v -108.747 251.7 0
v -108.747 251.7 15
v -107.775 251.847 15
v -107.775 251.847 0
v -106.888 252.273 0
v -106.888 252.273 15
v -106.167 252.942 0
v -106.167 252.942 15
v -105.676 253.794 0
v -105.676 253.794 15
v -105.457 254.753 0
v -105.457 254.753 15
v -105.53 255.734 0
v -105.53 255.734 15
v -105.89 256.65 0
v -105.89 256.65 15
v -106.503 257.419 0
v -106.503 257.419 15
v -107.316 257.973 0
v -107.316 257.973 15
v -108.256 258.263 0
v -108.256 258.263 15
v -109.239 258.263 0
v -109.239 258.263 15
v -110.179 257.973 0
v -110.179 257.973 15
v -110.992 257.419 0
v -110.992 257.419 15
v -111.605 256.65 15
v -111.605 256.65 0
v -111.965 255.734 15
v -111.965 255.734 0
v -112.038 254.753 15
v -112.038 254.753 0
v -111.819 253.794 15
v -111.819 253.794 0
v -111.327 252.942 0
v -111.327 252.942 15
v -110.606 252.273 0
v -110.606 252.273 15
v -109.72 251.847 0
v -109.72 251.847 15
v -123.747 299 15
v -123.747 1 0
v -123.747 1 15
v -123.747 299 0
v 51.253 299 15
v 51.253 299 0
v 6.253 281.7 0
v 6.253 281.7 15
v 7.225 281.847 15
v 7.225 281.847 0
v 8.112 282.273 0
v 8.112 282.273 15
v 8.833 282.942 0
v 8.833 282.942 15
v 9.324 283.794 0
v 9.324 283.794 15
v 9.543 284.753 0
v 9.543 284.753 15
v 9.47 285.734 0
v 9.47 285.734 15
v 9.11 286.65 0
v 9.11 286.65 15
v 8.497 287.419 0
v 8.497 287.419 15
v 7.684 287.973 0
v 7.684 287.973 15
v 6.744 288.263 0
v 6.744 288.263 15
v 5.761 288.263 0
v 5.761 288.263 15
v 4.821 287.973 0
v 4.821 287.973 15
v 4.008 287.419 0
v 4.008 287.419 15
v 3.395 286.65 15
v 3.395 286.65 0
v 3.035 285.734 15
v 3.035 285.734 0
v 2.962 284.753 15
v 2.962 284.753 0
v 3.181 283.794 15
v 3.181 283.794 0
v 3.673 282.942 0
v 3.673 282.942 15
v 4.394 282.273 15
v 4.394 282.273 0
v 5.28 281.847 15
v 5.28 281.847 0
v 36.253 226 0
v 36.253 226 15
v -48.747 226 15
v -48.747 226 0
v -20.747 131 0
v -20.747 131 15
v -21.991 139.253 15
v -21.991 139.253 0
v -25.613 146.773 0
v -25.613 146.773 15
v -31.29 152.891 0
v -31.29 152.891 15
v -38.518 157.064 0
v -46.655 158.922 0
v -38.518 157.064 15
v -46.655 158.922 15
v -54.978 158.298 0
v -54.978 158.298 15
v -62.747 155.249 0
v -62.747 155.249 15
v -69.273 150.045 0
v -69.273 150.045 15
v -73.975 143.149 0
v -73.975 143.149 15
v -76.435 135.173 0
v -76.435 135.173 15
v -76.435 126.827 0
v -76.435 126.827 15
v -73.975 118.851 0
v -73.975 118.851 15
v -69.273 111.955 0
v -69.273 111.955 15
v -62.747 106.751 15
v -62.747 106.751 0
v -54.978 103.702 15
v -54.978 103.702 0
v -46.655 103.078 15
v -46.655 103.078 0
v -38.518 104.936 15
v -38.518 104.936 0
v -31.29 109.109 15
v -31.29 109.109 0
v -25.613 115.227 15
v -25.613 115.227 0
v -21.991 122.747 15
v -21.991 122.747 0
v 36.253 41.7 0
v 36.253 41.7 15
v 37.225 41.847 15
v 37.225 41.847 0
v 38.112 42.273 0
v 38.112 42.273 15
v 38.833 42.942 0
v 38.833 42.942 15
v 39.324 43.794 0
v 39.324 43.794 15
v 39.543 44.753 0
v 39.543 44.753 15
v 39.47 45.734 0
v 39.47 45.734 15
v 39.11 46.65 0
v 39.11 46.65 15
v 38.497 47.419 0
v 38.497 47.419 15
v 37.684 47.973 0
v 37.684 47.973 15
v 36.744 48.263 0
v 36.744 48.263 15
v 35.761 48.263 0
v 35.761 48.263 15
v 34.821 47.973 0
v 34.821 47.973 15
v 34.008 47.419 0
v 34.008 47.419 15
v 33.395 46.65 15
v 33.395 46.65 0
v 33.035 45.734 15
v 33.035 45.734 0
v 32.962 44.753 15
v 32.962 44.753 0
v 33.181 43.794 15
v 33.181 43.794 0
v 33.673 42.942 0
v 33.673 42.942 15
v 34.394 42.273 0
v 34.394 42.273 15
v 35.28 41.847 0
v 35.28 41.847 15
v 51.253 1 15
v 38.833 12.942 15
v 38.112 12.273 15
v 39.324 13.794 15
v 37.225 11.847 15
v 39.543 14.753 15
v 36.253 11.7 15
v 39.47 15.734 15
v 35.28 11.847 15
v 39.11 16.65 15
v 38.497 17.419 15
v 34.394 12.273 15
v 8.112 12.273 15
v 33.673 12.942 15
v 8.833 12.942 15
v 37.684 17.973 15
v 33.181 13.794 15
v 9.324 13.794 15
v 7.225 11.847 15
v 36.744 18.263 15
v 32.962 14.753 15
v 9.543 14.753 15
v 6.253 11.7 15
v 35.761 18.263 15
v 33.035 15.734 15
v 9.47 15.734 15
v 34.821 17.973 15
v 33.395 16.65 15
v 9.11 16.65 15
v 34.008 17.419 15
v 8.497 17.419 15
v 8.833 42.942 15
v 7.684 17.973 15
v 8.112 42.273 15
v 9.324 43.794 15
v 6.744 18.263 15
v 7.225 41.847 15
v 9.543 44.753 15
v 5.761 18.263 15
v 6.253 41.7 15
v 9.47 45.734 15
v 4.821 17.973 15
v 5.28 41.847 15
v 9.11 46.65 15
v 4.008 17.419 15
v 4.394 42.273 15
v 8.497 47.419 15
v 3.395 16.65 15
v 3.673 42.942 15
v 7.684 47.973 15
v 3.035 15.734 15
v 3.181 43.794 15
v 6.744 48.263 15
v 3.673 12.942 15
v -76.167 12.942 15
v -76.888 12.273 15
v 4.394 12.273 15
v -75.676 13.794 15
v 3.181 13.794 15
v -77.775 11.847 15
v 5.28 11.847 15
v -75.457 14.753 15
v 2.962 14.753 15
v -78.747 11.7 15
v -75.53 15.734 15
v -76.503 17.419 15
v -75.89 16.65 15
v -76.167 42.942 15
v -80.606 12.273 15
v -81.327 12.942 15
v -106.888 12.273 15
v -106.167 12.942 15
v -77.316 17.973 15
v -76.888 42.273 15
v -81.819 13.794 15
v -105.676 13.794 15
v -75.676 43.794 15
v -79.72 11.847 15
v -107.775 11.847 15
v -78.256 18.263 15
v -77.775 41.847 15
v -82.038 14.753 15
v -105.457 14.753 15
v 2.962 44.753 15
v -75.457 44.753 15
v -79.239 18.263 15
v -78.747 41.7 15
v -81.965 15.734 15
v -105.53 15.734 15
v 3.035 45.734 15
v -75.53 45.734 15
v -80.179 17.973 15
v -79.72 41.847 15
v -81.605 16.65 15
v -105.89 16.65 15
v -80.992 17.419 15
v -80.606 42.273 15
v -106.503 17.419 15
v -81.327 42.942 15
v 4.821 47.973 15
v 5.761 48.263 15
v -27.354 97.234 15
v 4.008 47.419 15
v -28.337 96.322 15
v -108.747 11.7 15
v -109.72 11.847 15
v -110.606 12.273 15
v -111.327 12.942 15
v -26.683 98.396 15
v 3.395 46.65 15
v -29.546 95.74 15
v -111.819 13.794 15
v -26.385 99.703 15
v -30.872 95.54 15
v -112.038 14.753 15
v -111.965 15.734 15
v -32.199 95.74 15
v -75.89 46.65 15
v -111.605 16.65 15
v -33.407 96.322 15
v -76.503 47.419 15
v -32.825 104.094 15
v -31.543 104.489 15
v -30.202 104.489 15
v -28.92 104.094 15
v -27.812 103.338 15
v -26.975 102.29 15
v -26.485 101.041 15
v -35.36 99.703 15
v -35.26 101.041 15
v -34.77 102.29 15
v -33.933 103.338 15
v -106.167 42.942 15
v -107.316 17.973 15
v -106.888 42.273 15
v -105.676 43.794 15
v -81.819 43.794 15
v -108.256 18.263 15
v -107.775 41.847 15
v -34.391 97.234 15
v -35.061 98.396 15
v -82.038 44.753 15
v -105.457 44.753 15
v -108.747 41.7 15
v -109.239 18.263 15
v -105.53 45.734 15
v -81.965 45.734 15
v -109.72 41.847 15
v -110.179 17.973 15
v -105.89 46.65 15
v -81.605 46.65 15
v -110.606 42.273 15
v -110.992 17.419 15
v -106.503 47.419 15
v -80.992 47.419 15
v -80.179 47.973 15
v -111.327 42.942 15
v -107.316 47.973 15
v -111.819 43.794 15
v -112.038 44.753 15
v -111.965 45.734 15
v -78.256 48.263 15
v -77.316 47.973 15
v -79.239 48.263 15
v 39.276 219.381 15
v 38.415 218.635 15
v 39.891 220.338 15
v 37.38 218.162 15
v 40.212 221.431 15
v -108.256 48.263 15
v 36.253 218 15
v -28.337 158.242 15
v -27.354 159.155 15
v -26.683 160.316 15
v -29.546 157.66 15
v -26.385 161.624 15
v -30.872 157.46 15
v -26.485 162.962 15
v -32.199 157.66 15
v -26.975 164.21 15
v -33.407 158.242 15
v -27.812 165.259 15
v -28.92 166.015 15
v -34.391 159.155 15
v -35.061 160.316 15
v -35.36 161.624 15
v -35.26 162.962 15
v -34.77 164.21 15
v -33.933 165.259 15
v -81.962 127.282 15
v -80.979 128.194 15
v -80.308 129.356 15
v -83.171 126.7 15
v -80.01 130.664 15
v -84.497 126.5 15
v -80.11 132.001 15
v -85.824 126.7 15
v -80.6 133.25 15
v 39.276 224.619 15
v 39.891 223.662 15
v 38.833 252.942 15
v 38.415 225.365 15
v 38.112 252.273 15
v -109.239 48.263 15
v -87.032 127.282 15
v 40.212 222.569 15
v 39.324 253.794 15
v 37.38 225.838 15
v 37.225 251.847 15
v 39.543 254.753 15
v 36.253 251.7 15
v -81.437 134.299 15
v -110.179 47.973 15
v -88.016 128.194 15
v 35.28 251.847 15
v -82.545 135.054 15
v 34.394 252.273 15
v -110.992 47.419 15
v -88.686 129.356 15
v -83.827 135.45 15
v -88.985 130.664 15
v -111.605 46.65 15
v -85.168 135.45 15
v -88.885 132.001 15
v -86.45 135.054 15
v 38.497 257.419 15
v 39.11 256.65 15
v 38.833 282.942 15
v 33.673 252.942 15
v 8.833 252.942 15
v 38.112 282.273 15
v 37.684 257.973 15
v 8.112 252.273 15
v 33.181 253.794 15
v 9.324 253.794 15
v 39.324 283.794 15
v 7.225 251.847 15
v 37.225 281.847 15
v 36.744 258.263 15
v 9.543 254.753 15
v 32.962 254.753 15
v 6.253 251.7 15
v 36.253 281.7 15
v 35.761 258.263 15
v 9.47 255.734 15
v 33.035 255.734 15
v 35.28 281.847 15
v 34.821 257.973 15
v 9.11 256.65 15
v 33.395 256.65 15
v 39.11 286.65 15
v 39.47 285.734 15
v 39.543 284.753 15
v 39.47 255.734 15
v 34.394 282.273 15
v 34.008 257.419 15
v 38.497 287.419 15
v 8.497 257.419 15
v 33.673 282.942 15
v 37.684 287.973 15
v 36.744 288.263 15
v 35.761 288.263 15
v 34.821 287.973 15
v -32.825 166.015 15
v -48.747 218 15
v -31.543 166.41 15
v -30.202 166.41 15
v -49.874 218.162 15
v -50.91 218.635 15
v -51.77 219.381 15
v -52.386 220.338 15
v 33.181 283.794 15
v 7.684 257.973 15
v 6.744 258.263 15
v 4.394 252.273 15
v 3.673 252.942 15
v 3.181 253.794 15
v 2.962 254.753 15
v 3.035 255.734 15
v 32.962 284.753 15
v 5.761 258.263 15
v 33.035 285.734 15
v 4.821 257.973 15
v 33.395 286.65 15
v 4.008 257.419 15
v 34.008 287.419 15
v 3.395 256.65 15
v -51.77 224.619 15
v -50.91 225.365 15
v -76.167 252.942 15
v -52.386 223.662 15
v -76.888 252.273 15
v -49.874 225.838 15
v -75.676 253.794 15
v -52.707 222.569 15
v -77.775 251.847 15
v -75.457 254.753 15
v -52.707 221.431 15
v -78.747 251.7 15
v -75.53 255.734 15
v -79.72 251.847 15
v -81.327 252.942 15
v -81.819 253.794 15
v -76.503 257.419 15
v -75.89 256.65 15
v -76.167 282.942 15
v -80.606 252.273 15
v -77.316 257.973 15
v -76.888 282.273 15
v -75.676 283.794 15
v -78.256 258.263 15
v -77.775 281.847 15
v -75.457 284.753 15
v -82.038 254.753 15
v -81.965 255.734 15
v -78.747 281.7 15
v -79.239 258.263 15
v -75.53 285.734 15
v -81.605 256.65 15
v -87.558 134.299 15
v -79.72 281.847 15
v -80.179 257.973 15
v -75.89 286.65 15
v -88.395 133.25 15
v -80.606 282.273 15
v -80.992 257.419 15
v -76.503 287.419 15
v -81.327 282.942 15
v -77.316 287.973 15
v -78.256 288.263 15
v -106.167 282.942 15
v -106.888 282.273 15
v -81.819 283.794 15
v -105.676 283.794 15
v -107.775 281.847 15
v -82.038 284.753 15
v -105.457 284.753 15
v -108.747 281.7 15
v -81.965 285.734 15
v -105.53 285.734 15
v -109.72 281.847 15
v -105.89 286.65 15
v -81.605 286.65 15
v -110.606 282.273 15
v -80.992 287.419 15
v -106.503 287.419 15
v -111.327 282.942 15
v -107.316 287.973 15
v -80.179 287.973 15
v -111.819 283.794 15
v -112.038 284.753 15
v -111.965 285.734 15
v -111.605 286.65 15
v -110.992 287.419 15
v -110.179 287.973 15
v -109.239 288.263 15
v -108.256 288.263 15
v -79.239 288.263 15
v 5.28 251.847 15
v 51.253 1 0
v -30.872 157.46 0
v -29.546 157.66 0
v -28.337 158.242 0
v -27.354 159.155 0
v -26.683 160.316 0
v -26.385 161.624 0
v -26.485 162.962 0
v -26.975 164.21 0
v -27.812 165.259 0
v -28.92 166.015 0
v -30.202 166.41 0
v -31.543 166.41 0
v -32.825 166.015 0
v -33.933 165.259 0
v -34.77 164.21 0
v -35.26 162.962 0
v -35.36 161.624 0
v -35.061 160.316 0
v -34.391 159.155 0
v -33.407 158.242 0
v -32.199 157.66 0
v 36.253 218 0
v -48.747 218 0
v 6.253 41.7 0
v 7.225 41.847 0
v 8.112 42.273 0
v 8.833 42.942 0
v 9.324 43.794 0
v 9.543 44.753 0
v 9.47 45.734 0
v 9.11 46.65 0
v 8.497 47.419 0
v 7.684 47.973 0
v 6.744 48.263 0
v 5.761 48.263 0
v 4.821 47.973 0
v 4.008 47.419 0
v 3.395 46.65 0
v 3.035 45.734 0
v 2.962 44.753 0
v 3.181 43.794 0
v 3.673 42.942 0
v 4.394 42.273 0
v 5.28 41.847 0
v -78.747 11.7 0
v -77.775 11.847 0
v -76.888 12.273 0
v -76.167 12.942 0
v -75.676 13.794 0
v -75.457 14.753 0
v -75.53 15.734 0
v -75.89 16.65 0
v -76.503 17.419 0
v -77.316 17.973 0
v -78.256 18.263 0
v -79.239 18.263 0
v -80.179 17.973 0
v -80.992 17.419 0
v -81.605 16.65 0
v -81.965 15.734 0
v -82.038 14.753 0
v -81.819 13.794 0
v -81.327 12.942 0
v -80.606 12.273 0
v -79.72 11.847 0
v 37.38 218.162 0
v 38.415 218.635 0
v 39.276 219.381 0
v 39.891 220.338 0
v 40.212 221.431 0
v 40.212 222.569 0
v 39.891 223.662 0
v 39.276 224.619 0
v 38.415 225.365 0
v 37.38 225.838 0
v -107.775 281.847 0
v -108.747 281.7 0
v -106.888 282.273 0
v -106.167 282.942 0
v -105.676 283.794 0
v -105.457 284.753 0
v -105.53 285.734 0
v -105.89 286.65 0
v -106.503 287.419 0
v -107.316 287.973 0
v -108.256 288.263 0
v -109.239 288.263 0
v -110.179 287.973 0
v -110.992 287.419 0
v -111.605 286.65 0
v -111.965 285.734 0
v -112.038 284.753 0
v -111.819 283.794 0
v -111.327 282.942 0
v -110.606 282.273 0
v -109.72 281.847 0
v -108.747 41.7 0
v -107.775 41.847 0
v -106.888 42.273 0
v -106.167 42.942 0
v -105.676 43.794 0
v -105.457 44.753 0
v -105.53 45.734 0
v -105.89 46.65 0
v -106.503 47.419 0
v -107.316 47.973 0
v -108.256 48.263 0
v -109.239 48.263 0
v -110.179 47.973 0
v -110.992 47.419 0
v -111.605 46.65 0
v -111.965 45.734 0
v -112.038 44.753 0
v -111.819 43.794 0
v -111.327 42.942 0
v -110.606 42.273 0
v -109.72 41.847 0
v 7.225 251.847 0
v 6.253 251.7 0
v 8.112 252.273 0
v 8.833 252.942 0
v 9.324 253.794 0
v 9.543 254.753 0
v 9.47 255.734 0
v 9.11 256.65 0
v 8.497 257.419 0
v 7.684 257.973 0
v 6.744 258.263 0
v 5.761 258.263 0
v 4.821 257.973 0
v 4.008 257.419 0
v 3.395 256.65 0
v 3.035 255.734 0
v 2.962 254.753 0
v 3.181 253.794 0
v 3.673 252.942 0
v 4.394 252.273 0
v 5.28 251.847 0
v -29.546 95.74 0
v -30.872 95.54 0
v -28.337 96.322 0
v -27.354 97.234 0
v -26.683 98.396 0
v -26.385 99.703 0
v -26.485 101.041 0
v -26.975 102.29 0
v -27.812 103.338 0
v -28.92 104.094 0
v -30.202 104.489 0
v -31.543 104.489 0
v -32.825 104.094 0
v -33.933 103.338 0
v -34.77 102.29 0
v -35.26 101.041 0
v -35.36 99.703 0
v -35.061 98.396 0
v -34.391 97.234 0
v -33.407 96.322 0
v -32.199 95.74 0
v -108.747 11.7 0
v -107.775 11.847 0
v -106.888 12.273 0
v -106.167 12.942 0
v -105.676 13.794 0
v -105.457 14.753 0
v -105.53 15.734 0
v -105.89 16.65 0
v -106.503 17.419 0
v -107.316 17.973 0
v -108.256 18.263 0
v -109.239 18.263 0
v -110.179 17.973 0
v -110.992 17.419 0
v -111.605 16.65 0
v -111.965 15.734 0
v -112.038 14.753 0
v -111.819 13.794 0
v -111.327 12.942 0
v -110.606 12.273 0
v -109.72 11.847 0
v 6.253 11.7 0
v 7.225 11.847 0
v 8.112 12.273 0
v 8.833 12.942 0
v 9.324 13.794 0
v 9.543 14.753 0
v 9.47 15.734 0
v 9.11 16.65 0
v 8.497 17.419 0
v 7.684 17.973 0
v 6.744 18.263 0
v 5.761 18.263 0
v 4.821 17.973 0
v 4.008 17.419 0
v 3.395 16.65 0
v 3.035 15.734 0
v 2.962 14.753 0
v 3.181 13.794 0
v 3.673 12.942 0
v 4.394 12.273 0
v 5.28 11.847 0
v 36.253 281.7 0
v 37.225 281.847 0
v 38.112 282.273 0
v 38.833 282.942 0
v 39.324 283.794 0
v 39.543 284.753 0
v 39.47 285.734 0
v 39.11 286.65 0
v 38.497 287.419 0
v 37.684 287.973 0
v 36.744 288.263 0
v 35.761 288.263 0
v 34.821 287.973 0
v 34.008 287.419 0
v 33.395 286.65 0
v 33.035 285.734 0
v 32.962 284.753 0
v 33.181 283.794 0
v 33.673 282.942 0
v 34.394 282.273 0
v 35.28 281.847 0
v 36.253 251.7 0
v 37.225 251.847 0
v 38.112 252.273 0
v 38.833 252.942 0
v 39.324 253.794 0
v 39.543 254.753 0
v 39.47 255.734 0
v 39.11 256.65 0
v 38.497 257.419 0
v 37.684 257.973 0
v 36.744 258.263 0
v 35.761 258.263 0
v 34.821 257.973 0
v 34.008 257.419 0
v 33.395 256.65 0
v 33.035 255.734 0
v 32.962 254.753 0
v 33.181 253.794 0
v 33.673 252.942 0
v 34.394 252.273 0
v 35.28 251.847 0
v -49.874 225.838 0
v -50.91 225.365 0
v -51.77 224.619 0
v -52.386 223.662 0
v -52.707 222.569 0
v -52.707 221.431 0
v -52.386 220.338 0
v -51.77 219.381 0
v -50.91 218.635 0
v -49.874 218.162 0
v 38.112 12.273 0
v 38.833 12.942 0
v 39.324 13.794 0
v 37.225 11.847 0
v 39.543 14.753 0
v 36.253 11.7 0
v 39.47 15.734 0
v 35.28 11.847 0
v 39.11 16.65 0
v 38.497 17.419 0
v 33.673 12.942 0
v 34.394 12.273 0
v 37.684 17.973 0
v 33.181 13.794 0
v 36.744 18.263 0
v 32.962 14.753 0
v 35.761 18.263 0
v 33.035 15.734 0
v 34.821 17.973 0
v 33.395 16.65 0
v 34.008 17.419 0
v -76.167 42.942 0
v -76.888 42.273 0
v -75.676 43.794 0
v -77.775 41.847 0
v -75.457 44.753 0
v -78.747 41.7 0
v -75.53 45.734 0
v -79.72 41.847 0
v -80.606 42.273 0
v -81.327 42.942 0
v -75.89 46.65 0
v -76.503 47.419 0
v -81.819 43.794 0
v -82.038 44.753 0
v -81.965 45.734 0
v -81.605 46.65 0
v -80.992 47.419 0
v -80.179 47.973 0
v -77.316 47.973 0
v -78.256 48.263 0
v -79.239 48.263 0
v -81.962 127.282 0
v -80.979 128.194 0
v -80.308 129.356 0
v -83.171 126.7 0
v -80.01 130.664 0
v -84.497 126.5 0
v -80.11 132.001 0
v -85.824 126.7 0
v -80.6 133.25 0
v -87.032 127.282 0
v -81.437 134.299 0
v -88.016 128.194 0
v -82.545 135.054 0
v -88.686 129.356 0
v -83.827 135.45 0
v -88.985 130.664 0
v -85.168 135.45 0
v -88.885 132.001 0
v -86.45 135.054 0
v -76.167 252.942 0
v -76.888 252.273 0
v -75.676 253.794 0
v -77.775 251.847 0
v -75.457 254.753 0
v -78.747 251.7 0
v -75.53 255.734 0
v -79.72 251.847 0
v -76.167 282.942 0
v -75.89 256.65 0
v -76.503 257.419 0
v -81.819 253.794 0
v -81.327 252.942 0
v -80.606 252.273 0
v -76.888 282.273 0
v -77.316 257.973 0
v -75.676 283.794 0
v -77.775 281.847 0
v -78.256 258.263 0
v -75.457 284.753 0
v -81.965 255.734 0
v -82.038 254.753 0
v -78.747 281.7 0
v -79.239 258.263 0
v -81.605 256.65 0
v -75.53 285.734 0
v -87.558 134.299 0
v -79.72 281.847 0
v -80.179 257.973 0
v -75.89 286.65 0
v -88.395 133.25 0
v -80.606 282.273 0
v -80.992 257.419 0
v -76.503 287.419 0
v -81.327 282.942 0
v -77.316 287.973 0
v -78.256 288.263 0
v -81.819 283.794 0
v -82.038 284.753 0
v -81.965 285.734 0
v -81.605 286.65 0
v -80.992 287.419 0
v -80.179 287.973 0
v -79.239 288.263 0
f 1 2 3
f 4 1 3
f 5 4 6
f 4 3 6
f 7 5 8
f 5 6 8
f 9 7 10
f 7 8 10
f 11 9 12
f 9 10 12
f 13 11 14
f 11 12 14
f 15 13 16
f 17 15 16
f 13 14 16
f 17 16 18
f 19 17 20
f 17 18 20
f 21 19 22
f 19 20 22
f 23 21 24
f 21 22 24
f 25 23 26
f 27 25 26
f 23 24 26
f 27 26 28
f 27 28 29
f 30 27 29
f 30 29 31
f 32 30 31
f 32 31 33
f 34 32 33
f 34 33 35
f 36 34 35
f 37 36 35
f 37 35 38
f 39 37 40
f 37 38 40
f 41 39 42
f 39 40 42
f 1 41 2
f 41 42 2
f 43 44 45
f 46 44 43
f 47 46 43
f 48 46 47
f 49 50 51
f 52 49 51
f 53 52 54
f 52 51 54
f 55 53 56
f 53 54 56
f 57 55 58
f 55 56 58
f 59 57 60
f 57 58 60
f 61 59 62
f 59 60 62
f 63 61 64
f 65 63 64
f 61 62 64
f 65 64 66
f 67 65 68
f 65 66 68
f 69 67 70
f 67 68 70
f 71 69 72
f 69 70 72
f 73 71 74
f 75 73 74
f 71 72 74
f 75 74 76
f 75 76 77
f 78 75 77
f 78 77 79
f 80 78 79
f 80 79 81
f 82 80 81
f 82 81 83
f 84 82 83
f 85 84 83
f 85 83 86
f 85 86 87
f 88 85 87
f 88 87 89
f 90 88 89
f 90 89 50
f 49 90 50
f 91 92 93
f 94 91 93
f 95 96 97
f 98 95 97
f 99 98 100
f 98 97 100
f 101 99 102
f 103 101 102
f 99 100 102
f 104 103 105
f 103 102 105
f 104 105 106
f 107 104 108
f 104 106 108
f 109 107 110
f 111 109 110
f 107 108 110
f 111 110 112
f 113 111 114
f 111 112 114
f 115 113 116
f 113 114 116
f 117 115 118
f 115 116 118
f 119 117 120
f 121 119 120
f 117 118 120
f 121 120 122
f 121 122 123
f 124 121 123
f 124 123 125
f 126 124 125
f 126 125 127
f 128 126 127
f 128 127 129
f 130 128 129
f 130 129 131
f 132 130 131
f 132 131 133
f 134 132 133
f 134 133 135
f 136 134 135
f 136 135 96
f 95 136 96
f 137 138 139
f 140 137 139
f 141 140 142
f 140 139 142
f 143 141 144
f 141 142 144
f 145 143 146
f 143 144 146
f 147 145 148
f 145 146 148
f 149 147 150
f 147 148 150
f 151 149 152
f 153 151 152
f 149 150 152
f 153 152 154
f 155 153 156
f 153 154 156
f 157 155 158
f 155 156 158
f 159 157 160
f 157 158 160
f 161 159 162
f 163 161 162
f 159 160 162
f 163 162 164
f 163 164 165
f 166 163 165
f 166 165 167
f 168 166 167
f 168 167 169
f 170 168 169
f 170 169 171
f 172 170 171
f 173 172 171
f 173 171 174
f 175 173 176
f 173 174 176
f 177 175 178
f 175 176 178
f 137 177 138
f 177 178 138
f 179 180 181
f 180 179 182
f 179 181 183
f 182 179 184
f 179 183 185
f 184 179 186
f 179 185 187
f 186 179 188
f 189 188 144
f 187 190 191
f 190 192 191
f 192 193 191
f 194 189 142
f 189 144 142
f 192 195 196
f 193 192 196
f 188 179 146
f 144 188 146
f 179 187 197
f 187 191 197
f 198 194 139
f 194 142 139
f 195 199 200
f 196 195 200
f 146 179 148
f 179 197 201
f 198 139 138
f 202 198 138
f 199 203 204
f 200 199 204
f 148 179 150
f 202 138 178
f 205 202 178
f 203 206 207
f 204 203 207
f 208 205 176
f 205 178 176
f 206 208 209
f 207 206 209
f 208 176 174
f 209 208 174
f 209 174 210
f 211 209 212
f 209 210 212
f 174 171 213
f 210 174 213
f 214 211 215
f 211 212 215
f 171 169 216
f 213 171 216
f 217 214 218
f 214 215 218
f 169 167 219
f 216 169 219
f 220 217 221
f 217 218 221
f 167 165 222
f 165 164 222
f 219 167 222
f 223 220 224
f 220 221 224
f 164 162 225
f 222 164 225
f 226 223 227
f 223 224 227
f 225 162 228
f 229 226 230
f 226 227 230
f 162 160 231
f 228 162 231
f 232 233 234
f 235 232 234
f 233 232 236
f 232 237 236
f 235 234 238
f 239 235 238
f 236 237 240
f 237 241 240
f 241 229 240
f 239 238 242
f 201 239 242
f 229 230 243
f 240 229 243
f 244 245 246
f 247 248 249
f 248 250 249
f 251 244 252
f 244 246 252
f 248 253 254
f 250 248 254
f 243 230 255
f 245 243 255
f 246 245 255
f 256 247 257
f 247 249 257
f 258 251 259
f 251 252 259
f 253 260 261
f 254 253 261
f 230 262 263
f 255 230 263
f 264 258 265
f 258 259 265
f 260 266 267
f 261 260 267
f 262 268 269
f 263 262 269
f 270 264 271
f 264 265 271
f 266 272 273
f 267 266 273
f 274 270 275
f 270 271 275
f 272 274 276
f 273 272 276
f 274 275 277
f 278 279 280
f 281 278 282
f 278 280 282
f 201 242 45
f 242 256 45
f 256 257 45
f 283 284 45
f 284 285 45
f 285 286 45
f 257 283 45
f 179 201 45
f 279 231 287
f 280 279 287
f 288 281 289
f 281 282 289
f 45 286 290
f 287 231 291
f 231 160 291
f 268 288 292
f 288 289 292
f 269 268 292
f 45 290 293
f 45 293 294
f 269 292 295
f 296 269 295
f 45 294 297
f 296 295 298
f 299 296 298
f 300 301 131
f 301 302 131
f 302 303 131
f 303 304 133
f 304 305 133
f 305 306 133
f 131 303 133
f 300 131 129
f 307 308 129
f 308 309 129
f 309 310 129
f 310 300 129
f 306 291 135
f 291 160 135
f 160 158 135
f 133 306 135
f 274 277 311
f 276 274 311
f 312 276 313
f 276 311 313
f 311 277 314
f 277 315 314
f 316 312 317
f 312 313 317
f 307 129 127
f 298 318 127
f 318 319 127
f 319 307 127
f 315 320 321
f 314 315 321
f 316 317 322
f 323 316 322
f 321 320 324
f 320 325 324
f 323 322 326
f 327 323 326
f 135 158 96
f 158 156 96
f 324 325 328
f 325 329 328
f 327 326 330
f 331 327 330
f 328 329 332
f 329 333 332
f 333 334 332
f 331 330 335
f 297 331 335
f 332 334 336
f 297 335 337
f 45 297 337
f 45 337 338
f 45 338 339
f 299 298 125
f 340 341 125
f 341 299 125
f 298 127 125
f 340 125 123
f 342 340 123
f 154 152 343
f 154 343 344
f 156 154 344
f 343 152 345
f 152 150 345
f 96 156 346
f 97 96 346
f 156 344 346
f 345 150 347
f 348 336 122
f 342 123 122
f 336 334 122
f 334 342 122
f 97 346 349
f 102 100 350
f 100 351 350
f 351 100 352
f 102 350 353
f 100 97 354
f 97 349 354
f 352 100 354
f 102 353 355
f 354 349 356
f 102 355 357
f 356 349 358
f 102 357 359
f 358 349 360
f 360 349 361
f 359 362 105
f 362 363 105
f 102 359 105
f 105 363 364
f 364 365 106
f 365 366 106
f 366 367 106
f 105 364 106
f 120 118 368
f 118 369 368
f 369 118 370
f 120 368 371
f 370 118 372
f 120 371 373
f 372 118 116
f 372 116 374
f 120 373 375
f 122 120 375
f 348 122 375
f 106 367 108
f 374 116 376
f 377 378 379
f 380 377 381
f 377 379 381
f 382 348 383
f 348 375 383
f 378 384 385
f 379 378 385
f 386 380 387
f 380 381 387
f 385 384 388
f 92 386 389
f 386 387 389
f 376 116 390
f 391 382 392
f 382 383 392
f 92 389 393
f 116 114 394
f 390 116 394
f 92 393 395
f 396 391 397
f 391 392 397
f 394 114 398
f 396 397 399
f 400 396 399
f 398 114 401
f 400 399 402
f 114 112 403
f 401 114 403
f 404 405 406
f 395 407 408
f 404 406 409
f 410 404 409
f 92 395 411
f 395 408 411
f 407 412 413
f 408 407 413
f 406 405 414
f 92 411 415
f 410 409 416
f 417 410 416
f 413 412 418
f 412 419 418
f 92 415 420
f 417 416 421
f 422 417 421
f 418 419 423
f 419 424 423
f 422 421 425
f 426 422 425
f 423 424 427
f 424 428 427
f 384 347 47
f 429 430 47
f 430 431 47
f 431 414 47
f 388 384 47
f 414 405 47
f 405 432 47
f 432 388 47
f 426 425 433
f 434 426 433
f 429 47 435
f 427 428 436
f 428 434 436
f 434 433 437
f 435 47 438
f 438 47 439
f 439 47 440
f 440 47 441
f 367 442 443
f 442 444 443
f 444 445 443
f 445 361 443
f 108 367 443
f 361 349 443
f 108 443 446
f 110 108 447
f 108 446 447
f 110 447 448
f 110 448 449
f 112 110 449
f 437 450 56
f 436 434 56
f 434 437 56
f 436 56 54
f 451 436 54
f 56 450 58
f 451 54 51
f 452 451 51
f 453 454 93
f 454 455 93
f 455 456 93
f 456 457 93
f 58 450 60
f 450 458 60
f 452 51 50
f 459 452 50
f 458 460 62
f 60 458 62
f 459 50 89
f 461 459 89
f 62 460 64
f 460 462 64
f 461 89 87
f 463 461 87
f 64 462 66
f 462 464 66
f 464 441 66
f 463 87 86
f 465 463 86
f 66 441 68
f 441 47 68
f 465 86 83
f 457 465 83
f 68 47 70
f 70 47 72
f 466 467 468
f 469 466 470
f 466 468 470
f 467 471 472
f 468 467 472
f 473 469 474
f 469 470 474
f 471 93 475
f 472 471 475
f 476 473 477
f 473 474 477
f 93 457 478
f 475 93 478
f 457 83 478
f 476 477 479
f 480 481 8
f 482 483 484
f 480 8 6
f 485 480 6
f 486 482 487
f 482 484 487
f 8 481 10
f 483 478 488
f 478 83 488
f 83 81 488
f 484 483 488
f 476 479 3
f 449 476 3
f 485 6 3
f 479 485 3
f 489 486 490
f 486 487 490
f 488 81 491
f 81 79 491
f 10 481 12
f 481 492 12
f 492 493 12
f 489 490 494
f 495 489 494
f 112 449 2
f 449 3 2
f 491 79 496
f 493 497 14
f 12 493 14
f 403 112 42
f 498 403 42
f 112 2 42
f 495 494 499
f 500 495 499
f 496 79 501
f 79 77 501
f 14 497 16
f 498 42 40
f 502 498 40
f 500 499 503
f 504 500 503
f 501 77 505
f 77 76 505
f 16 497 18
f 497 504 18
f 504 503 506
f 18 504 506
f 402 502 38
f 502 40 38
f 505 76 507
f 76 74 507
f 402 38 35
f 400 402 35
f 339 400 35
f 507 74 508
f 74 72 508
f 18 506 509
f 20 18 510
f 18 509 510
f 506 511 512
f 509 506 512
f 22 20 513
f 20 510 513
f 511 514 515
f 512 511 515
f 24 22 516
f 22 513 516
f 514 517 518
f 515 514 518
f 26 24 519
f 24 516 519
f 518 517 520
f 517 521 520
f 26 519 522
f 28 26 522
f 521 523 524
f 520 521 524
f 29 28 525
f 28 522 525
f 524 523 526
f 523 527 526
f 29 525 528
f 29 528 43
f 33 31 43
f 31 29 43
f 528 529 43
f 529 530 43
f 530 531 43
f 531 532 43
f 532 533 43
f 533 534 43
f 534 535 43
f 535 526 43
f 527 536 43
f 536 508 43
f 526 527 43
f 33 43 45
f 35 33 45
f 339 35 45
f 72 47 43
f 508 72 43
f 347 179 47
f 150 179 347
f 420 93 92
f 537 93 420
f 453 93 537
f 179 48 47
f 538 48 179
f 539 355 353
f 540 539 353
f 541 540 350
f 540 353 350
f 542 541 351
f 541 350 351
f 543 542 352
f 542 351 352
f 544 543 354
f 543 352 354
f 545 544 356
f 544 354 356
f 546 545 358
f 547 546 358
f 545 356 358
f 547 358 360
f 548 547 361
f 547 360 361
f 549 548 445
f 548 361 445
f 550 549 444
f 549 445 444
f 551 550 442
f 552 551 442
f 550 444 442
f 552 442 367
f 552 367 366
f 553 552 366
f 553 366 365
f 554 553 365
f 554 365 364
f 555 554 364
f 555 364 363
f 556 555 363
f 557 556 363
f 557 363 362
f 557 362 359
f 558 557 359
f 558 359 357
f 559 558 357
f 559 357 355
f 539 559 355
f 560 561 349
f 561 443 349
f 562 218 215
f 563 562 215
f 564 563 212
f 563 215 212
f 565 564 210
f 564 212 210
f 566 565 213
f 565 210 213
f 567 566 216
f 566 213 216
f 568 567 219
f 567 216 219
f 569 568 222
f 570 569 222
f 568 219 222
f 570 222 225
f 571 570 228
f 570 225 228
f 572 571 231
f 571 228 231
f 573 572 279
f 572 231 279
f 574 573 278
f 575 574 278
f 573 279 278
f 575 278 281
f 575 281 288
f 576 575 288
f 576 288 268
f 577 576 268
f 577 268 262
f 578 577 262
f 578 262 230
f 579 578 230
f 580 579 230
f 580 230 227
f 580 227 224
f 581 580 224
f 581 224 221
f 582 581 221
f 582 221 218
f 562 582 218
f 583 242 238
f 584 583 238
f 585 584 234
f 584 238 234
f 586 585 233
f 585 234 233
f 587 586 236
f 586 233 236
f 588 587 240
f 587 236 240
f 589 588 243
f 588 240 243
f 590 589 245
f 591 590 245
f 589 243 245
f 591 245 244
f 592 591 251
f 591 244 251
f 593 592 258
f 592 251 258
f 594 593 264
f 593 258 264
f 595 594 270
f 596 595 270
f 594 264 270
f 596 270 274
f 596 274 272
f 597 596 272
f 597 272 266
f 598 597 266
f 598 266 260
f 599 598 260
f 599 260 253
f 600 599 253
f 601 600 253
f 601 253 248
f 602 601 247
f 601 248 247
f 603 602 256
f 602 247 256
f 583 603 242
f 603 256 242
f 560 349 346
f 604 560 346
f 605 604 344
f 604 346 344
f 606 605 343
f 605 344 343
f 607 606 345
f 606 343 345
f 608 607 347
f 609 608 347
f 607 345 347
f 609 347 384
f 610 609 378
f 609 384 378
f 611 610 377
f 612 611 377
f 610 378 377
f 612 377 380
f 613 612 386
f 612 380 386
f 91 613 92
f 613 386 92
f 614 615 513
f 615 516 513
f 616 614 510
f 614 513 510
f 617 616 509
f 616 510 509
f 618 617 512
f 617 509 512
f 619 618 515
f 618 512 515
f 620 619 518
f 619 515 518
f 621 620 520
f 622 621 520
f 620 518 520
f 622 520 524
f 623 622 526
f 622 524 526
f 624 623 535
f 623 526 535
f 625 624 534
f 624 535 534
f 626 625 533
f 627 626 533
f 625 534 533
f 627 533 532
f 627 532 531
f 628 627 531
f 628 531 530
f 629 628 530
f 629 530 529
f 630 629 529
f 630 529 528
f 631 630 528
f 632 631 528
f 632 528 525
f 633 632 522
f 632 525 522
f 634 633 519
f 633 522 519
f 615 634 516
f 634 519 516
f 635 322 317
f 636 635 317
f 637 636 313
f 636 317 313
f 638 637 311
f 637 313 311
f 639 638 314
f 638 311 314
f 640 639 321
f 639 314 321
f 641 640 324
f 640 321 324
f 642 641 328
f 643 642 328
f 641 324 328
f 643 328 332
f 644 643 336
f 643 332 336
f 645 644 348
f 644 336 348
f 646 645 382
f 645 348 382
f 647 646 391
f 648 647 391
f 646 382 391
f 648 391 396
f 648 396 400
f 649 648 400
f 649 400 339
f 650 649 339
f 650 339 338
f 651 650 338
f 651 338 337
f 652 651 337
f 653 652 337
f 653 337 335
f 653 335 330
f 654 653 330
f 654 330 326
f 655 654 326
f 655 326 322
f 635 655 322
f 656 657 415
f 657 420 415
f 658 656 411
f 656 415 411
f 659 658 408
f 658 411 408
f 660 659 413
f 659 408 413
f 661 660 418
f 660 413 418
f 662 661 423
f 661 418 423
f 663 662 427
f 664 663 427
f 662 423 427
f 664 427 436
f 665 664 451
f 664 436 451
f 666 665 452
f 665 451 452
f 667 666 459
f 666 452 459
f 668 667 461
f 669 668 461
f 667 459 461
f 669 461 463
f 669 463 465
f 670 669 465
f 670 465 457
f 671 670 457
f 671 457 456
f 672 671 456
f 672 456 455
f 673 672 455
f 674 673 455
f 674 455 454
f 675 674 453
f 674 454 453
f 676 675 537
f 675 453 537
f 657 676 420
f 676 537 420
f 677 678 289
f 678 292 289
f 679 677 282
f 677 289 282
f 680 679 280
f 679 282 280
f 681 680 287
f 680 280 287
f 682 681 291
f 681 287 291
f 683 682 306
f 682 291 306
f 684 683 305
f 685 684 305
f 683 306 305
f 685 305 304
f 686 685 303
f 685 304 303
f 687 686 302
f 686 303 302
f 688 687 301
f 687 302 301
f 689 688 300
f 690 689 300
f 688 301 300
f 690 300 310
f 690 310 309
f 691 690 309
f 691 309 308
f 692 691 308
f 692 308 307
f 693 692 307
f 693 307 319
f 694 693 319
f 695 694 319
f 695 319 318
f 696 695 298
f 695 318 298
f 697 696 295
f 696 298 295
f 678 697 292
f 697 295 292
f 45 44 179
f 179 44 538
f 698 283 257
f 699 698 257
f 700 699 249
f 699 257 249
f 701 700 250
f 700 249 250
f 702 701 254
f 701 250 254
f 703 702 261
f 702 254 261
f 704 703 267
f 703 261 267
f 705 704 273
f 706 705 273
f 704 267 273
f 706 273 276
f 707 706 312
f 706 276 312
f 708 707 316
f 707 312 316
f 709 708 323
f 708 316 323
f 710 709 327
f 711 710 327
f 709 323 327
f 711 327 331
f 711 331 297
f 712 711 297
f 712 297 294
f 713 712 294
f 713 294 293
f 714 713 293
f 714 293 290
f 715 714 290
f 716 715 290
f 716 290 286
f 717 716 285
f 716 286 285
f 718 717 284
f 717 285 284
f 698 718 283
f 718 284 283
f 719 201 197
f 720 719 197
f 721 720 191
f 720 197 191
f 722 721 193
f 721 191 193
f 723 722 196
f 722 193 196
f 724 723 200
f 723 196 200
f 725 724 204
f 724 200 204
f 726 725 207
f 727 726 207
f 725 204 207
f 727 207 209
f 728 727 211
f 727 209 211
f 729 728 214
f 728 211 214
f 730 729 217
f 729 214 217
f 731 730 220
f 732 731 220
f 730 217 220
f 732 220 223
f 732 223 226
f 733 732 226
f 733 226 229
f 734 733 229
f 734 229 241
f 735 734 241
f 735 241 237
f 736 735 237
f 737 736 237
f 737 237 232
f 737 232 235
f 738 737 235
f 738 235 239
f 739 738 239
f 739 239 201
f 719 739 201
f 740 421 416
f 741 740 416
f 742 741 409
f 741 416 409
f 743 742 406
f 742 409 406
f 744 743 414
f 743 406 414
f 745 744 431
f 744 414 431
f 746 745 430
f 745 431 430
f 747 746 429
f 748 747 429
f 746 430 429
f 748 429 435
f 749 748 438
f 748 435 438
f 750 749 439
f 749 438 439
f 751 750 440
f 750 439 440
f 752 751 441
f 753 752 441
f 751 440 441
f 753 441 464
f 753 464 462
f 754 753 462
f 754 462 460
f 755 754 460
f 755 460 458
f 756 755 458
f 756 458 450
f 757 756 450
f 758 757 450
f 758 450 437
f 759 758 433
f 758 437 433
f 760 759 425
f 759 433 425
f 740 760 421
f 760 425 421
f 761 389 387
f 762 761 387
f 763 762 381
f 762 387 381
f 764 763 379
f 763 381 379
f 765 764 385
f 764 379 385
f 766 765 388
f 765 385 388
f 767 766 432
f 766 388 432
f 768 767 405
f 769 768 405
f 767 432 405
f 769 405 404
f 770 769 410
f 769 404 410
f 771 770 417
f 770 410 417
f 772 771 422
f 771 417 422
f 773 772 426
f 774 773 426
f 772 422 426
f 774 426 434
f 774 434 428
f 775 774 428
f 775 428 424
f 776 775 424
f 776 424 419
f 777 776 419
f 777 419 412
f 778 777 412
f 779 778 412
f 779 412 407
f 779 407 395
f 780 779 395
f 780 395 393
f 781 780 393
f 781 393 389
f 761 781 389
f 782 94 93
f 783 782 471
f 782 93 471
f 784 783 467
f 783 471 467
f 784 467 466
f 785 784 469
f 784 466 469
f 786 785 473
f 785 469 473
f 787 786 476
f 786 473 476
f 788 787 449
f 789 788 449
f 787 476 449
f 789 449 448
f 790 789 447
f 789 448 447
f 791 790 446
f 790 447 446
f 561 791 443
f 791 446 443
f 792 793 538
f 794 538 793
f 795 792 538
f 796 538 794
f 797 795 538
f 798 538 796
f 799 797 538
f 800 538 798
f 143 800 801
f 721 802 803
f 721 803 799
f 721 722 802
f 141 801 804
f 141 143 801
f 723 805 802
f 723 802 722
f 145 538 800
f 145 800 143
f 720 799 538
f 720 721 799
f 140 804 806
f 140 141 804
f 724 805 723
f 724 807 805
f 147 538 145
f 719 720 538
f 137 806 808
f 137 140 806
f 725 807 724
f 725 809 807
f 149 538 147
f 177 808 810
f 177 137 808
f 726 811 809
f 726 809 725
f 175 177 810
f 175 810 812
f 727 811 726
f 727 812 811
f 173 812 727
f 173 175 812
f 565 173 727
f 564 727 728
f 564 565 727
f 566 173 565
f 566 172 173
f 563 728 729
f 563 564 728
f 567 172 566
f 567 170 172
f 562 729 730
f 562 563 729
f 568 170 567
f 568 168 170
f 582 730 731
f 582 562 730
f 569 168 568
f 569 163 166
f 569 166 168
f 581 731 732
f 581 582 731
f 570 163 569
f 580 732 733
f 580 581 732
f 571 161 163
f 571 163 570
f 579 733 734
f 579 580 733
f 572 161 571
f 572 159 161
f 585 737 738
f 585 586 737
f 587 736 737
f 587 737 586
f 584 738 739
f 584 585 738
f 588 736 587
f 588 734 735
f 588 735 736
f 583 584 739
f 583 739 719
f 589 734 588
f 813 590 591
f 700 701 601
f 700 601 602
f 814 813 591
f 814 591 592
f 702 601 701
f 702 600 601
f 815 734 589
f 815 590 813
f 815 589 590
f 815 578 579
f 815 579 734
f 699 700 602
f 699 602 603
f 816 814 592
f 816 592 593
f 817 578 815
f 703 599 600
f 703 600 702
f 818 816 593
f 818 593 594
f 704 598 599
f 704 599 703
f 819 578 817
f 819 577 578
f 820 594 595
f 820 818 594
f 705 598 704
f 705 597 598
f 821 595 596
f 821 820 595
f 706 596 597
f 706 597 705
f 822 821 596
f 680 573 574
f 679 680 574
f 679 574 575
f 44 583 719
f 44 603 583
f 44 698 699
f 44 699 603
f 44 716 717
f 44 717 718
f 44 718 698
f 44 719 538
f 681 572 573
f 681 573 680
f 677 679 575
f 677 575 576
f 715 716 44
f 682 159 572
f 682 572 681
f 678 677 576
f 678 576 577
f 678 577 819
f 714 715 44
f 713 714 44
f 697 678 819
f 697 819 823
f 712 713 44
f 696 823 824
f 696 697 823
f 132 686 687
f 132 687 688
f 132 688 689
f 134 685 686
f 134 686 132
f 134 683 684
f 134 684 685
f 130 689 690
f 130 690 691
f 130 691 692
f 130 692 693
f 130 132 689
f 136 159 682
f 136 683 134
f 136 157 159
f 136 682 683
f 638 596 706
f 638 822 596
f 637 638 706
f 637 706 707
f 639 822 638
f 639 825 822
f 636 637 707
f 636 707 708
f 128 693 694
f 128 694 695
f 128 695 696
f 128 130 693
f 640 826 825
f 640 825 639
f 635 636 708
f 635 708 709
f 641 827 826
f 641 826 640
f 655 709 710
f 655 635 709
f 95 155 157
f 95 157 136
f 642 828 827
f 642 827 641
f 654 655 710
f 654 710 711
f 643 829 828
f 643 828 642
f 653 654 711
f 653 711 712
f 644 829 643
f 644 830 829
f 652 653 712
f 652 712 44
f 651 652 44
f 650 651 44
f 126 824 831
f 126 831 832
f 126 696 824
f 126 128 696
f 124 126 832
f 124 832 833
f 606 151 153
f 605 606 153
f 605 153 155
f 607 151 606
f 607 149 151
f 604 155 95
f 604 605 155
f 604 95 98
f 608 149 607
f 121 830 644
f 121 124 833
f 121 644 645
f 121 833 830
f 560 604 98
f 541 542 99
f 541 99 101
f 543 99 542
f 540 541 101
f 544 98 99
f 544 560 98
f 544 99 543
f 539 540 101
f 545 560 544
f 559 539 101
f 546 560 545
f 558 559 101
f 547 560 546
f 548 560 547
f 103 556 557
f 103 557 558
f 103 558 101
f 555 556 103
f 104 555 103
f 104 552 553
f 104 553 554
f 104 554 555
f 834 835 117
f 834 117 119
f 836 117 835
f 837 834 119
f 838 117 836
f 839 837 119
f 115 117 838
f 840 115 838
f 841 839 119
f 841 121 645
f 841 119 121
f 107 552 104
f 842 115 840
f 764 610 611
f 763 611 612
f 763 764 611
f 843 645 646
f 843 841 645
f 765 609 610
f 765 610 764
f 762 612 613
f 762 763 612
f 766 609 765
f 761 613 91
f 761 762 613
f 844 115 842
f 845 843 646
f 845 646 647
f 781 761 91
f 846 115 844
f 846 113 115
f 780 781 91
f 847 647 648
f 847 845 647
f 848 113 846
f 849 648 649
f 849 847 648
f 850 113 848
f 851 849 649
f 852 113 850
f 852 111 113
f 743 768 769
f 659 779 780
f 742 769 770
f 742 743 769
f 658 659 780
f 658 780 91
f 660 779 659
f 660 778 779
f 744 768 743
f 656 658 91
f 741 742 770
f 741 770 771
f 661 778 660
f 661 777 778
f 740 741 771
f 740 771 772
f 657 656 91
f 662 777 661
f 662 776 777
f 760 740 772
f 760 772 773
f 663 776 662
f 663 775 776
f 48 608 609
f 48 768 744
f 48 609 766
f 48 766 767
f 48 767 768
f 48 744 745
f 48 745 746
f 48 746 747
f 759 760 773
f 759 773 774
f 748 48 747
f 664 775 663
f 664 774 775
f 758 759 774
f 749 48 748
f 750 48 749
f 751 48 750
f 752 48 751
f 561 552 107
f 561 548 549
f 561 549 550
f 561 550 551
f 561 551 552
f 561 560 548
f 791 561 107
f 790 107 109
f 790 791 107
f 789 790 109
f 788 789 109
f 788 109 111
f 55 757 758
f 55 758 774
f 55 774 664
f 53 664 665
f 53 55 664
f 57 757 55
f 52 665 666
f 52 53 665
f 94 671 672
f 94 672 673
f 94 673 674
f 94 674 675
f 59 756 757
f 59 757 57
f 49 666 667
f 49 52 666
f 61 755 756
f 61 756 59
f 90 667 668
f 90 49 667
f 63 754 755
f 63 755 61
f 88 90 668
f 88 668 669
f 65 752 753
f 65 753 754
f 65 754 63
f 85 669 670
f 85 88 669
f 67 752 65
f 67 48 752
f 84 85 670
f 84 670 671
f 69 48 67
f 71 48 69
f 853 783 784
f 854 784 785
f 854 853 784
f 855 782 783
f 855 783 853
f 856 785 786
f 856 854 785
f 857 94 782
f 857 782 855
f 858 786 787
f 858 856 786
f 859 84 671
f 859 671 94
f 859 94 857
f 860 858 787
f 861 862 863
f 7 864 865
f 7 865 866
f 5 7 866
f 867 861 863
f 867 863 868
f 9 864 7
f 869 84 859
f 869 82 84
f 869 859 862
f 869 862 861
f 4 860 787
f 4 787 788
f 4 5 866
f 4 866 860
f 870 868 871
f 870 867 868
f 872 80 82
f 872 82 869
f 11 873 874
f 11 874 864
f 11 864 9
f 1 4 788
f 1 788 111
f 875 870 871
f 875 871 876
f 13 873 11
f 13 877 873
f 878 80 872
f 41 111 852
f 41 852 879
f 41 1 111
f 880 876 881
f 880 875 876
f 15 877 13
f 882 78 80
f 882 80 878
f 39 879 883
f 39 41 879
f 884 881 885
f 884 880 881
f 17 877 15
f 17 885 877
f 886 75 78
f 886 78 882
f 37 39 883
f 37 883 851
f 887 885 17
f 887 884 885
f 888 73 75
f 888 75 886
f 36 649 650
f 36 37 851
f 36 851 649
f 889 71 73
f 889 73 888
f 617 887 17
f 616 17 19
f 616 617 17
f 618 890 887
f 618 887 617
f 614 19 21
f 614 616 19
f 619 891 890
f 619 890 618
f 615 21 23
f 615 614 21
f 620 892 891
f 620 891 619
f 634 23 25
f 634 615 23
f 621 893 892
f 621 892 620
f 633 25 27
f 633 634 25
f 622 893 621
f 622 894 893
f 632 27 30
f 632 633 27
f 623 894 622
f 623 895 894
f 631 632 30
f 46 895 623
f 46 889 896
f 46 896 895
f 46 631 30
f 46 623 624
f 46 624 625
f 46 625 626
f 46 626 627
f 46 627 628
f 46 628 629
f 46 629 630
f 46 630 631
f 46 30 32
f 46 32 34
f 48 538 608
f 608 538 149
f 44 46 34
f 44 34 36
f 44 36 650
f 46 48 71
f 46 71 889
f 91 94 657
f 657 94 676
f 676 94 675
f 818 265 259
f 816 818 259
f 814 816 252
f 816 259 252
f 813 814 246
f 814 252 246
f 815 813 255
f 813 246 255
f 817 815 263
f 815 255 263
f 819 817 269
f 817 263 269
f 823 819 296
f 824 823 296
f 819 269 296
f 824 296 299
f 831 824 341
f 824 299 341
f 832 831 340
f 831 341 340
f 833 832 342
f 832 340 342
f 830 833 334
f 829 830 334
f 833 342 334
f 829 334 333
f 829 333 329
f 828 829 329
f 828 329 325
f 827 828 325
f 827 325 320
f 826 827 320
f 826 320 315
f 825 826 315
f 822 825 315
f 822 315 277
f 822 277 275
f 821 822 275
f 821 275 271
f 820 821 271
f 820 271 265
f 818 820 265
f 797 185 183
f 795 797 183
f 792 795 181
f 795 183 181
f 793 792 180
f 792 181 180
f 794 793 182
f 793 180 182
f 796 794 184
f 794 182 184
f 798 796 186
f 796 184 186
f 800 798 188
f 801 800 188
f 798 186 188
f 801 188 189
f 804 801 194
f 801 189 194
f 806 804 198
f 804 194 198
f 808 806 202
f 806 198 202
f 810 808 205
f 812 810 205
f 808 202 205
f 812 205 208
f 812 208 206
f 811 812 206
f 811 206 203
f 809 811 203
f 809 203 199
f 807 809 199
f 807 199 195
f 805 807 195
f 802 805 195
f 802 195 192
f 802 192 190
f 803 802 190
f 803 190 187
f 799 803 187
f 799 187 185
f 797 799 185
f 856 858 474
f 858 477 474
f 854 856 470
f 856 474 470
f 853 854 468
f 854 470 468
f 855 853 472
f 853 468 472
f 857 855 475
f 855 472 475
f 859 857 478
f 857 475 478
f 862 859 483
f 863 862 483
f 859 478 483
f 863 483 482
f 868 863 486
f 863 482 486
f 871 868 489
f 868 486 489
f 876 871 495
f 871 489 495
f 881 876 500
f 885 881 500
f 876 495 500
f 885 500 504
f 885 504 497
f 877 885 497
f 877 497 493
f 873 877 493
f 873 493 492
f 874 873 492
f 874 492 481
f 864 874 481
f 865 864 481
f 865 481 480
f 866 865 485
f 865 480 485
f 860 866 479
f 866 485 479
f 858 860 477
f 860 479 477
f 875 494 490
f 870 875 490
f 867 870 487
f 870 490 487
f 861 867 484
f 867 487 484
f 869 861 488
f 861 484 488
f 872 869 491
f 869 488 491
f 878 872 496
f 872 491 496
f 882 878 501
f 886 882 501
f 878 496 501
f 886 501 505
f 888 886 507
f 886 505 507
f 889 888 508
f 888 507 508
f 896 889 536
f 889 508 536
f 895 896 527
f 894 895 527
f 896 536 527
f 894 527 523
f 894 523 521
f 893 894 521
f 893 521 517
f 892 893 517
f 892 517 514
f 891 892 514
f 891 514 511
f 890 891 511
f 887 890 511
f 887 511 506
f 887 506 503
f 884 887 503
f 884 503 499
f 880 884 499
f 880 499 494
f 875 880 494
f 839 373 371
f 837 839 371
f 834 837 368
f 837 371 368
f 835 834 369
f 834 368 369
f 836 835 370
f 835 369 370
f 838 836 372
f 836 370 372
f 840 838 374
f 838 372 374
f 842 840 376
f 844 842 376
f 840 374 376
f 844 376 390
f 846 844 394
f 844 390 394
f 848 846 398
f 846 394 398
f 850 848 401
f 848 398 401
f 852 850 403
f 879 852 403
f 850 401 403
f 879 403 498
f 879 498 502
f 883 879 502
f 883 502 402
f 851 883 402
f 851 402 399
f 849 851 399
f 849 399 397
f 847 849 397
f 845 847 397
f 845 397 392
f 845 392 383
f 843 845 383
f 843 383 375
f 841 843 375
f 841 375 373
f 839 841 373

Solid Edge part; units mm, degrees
sketch "Sketch1" plane through (0, 0, 0) normal (0, 0, 1) x (1, 0, 0)
  line L0 (-123.7474, 0) -> (-123.7474, 300)
  line L1 (-123.7474, 300) -> (51.2526, 300)
  line L2 (51.2526, 300) -> (51.2526, 0)
  line L3 (51.2526, 0) -> (-123.7474, 0)
  dimension "D1" = 300
  dimension "D2" = 175
extrude "Protrusion1" add sketch "Sketch1" along normal blind 15
sketch "Sketch2" plane through (-248.7474, 300, 15) normal (0, 0, 1) x (1, 0, 0)
  circle A0 centre (200, -169) radius 28
  dimension "D1" = 56
  dimension "D2" = 131
  dimension "D3" = 75
extrude "Cutout1" cut sketch "Sketch2" against normal through all
hole "Hole_17" at (-30.8724, 100.0396, 15) direction (0, 0, -1) diameter 9 end up to next
hole "Hole1" at (-84.4974, 131, 15) direction (0, 0, -1) diameter 9 end up to next
hole "Hole2" at (-30.8724, 161.9604, 15) direction (0, 0, -1) diameter 9 end up to next
hole "Hole_9" at (36.2526, 45, 15) direction (0, 0, -1) diameter 6.6 end up to next
hole "Hole3" at (-108.7474, 45, 15) direction (0, 0, -1) diameter 6.6 end up to next
hole "Hole4" at (-108.7474, 15, 15) direction (0, 0, -1) diameter 6.6 end up to next
hole "Hole5" at (-108.7474, 255, 15) direction (0, 0, -1) diameter 6.6 end up to next
hole "Hole6" at (-108.7474, 285, 15) direction (0, 0, -1) diameter 6.6 end up to next
hole "Hole7" at (36.2526, 285, 15) direction (0, 0, -1) diameter 6.6 end up to next
hole "Hole8" at (36.2526, 255, 15) direction (0, 0, -1) diameter 6.6 end up to next
hole "Hole9" at (36.2526, 15, 15) direction (0, 0, -1) diameter 6.6 end up to next
hole "Hole10" at (6.2526, 15, 15) direction (0, 0, -1) diameter 6.6 end up to next
hole "Hole11" at (6.2526, 45, 15) direction (0, 0, -1) diameter 6.6 end up to next
hole "Hole12" at (-78.7474, 15, 15) direction (0, 0, -1) diameter 6.6 end up to next
hole "Hole13" at (-78.7474, 45, 15) direction (0, 0, -1) diameter 6.6 end up to next
hole "Hole14" at (6.2526, 255, 15) direction (0, 0, -1) diameter 6.6 end up to next
hole "Hole15" at (6.2526, 285, 15) direction (0, 0, -1) diameter 6.6 end up to next
hole "Hole16" at (-78.7474, 255, 15) direction (0, 0, -1) diameter 6.6 end up to next
hole "Hole17" at (-78.7474, 285, 15) direction (0, 0, -1) diameter 6.6 end up to next
sketch "Sketch3" plane through (-23.7474, 150, 15) normal (0, 0, 1) x (-1, 0, 0)
  circle A0 centre (-60, -72) radius 4
  circle A1 centre (25, -72) radius 4
  line L0 (-60, -68) -> (-60, -76)
  line L1 (-60, -76) -> (25, -76)
  line L2 (25, -76) -> (25, -68)
  line L3 (25, -68) -> (-60, -68)
  dimension "D1" = 8
  dimension "D2" = 85
  dimension "D3" = 91
extrude "Cutout2" cut sketch "Sketch3" against normal through all
sketch "Sketch4" plane through (-36.2474, 150, 0) normal (0, 0, -1) x (1, 0, 0)
  line L0 (-110.52, -149) -> (154.44, -149)
  line L1 (154.44, -149) -> (154.44, -163.44)
  line L2 (154.44, -163.44) -> (-110.52, -163.44)
  line L3 (-110.52, -163.44) -> (-110.52, -149)
  line L4 (-104.04, 177.84) -> (-104.04, 149)
  line L5 (-104.04, 149) -> (129.24, 149)
  line L6 (129.24, 149) -> (129.24, 177.84)
  line L7 (129.24, 177.84) -> (-104.04, 177.84)
  dimension "D1" = 1
  dimension "D2" = 1
extrude "Cutout3" cut sketch "Sketch4" against normal through all
properties material "Aluminum, 6061-T6"
